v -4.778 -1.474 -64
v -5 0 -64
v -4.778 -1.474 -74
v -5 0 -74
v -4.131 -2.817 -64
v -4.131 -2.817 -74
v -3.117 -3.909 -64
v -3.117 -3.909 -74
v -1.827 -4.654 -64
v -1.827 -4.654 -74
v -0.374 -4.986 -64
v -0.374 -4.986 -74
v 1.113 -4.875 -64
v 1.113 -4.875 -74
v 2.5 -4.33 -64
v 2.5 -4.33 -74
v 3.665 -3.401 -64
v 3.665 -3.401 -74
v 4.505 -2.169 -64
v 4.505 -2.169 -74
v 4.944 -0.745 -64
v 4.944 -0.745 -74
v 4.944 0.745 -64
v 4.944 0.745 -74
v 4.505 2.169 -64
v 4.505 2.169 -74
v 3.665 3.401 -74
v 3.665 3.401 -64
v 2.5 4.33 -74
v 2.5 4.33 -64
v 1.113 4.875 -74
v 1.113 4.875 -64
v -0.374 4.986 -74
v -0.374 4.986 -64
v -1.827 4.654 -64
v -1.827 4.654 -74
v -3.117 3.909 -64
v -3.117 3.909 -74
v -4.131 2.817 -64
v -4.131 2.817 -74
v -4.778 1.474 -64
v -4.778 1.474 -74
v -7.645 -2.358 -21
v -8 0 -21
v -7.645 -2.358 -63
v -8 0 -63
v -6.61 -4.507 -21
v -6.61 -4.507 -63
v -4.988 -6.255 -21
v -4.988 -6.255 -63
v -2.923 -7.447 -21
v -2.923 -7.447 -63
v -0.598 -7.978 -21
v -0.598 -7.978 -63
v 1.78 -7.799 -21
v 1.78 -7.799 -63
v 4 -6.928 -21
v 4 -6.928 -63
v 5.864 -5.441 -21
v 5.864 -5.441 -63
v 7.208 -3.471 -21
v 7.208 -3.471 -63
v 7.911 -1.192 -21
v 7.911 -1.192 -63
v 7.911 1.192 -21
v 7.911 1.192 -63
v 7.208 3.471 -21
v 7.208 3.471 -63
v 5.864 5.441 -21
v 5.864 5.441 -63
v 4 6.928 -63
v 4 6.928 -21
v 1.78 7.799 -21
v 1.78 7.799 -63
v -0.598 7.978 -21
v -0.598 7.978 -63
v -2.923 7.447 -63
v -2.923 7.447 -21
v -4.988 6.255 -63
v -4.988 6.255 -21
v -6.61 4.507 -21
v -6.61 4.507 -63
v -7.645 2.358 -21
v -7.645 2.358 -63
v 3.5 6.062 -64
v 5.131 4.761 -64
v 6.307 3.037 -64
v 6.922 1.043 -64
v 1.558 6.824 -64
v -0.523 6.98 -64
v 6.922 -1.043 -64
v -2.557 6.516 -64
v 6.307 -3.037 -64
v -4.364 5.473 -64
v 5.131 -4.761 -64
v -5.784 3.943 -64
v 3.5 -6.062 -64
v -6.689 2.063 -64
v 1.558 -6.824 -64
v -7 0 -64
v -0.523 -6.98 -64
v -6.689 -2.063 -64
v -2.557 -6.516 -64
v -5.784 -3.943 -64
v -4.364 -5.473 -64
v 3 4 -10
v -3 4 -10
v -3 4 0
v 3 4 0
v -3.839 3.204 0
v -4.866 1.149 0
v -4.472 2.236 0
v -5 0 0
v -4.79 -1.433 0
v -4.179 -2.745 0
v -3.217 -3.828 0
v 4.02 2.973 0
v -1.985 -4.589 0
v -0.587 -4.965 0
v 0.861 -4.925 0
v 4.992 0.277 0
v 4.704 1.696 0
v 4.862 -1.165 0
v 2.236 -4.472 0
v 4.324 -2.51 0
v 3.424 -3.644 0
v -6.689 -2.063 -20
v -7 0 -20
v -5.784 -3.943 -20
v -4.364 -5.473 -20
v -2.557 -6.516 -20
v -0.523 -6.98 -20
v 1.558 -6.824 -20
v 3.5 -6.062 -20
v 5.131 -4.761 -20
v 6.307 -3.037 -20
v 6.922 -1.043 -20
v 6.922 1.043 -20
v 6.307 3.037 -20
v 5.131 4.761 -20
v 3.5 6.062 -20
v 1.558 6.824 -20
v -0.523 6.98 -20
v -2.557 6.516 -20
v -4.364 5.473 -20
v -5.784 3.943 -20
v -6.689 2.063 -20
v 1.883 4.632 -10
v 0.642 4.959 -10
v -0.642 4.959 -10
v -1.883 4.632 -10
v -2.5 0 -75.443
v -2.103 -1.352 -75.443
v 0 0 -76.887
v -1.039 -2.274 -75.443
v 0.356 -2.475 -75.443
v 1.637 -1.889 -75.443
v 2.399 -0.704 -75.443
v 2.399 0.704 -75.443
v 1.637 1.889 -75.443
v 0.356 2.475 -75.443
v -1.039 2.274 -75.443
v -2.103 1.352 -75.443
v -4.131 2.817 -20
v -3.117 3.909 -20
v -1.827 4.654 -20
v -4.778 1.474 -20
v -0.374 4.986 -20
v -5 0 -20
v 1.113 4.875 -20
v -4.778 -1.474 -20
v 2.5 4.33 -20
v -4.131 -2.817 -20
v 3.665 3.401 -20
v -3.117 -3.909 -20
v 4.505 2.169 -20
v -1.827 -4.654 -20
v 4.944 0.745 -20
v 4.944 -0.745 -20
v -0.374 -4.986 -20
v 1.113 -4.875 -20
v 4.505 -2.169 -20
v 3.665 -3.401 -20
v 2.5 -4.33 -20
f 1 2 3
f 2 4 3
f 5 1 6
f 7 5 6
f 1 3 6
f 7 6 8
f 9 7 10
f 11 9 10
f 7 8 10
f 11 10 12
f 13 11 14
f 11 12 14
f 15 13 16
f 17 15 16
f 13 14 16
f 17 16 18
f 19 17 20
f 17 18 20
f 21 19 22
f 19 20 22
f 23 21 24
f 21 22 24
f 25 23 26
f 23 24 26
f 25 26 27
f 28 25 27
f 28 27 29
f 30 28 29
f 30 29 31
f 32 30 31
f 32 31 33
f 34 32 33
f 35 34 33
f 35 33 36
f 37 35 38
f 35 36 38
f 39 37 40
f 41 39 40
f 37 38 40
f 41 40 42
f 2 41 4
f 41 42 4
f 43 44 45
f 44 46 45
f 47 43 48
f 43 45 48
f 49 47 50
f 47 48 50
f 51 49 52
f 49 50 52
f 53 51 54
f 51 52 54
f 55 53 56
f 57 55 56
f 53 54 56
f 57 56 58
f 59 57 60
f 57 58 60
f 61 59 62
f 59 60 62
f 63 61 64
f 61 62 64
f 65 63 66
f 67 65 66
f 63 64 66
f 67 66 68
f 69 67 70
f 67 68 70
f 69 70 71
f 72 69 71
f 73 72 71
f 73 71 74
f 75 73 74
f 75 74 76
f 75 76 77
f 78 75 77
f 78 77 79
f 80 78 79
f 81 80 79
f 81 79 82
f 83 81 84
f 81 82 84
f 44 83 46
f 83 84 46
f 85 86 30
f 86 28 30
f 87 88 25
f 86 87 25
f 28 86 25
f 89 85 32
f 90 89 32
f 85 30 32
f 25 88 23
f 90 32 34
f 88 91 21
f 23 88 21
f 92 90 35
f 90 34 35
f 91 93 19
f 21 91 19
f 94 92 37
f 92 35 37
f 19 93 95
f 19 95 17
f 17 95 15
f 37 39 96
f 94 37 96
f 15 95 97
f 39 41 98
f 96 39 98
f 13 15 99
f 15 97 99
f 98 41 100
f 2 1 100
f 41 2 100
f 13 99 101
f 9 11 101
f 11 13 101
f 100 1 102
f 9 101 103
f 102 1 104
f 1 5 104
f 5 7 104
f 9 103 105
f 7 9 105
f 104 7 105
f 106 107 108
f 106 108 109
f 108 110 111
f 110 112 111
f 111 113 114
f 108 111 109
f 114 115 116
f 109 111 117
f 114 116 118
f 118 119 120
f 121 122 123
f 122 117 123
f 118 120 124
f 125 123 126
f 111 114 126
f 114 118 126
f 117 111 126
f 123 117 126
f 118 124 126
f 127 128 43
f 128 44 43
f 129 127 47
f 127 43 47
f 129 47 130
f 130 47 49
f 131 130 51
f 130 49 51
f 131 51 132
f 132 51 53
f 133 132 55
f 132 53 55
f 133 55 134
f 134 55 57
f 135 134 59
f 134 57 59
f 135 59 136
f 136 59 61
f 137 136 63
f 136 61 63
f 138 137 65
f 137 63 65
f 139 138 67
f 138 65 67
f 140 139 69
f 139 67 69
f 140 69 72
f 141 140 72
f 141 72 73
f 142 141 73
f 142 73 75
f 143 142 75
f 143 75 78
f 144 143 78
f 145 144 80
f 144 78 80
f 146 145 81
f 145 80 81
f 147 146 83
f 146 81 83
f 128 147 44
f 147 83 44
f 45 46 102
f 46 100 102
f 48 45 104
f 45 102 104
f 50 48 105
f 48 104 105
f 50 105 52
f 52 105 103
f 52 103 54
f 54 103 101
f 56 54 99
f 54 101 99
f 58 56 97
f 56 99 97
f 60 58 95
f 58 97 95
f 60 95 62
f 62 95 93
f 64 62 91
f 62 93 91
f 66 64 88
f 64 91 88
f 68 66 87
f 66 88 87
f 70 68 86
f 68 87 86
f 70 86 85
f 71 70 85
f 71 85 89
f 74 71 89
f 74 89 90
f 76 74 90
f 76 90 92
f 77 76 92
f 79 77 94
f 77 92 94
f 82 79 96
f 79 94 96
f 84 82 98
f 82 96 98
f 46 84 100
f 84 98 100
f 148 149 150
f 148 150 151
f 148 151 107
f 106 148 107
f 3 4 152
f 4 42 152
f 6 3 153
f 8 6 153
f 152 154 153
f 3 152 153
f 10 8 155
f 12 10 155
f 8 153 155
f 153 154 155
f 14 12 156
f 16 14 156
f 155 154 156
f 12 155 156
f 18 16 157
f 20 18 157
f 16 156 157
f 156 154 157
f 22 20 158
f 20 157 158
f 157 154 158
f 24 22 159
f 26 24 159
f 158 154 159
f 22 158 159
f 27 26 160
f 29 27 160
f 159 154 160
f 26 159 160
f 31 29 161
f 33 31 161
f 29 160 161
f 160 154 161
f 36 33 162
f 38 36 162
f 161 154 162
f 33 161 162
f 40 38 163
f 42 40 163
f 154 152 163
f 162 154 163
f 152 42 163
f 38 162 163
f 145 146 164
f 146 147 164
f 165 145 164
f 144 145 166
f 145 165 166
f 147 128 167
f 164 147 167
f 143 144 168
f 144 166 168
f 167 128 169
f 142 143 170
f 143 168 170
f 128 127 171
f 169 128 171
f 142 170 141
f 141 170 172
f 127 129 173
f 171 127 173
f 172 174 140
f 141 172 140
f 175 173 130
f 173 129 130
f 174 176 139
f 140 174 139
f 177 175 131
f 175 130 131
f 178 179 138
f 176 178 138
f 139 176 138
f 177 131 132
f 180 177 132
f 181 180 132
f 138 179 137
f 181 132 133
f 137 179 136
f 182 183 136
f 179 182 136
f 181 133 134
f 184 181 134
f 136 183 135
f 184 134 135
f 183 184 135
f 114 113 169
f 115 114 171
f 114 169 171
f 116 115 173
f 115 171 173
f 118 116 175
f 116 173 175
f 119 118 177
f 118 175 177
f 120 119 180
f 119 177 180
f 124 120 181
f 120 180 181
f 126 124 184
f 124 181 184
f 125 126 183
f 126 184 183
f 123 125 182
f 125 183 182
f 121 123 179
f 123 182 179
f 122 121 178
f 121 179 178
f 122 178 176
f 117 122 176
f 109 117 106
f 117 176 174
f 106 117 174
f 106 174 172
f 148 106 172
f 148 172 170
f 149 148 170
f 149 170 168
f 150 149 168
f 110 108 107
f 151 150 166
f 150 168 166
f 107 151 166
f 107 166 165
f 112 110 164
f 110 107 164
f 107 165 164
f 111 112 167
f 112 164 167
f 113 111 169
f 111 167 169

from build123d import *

# Parameters (mm, degrees)
CUT_EXTRUDE1_START = -10
CUT_EXTRUDE1_DEPTH = 10


with BuildPart() as part:
    # Sketch1 → Revolve1 (revolve)
    with BuildSketch(Plane(origin=(0, 0, 0), x_dir=(1, 0, 0), z_dir=(0, 1, 0)), mode=Mode.PRIVATE) as revolve1_sk:
        Polygon((0, 74), (0, 0), (5, 0), (5, 20), (7, 20), (8, 21), (8, 63), (7, 64), (5, 64), (5, 74), (0, 76.886751346), align=None)
    revolve(revolve1_sk.sketch.rotate(Axis((0, 0, -74), (0, 0, 1)), 180), axis=Axis((0, 0, -74), (0, 0, 1)))

    # Sketch2 → Cut-Extrude1 (cut)
    with BuildSketch(Plane.XY.offset(CUT_EXTRUDE1_START)):
        with BuildLine():
            Line((-3, 4), (3, 4))
            ThreePointArc((3, 4), (0, 5), (-3, 4))
        make_face()
    extrude(amount=CUT_EXTRUDE1_DEPTH, mode=Mode.SUBTRACT)


solid = part.part
